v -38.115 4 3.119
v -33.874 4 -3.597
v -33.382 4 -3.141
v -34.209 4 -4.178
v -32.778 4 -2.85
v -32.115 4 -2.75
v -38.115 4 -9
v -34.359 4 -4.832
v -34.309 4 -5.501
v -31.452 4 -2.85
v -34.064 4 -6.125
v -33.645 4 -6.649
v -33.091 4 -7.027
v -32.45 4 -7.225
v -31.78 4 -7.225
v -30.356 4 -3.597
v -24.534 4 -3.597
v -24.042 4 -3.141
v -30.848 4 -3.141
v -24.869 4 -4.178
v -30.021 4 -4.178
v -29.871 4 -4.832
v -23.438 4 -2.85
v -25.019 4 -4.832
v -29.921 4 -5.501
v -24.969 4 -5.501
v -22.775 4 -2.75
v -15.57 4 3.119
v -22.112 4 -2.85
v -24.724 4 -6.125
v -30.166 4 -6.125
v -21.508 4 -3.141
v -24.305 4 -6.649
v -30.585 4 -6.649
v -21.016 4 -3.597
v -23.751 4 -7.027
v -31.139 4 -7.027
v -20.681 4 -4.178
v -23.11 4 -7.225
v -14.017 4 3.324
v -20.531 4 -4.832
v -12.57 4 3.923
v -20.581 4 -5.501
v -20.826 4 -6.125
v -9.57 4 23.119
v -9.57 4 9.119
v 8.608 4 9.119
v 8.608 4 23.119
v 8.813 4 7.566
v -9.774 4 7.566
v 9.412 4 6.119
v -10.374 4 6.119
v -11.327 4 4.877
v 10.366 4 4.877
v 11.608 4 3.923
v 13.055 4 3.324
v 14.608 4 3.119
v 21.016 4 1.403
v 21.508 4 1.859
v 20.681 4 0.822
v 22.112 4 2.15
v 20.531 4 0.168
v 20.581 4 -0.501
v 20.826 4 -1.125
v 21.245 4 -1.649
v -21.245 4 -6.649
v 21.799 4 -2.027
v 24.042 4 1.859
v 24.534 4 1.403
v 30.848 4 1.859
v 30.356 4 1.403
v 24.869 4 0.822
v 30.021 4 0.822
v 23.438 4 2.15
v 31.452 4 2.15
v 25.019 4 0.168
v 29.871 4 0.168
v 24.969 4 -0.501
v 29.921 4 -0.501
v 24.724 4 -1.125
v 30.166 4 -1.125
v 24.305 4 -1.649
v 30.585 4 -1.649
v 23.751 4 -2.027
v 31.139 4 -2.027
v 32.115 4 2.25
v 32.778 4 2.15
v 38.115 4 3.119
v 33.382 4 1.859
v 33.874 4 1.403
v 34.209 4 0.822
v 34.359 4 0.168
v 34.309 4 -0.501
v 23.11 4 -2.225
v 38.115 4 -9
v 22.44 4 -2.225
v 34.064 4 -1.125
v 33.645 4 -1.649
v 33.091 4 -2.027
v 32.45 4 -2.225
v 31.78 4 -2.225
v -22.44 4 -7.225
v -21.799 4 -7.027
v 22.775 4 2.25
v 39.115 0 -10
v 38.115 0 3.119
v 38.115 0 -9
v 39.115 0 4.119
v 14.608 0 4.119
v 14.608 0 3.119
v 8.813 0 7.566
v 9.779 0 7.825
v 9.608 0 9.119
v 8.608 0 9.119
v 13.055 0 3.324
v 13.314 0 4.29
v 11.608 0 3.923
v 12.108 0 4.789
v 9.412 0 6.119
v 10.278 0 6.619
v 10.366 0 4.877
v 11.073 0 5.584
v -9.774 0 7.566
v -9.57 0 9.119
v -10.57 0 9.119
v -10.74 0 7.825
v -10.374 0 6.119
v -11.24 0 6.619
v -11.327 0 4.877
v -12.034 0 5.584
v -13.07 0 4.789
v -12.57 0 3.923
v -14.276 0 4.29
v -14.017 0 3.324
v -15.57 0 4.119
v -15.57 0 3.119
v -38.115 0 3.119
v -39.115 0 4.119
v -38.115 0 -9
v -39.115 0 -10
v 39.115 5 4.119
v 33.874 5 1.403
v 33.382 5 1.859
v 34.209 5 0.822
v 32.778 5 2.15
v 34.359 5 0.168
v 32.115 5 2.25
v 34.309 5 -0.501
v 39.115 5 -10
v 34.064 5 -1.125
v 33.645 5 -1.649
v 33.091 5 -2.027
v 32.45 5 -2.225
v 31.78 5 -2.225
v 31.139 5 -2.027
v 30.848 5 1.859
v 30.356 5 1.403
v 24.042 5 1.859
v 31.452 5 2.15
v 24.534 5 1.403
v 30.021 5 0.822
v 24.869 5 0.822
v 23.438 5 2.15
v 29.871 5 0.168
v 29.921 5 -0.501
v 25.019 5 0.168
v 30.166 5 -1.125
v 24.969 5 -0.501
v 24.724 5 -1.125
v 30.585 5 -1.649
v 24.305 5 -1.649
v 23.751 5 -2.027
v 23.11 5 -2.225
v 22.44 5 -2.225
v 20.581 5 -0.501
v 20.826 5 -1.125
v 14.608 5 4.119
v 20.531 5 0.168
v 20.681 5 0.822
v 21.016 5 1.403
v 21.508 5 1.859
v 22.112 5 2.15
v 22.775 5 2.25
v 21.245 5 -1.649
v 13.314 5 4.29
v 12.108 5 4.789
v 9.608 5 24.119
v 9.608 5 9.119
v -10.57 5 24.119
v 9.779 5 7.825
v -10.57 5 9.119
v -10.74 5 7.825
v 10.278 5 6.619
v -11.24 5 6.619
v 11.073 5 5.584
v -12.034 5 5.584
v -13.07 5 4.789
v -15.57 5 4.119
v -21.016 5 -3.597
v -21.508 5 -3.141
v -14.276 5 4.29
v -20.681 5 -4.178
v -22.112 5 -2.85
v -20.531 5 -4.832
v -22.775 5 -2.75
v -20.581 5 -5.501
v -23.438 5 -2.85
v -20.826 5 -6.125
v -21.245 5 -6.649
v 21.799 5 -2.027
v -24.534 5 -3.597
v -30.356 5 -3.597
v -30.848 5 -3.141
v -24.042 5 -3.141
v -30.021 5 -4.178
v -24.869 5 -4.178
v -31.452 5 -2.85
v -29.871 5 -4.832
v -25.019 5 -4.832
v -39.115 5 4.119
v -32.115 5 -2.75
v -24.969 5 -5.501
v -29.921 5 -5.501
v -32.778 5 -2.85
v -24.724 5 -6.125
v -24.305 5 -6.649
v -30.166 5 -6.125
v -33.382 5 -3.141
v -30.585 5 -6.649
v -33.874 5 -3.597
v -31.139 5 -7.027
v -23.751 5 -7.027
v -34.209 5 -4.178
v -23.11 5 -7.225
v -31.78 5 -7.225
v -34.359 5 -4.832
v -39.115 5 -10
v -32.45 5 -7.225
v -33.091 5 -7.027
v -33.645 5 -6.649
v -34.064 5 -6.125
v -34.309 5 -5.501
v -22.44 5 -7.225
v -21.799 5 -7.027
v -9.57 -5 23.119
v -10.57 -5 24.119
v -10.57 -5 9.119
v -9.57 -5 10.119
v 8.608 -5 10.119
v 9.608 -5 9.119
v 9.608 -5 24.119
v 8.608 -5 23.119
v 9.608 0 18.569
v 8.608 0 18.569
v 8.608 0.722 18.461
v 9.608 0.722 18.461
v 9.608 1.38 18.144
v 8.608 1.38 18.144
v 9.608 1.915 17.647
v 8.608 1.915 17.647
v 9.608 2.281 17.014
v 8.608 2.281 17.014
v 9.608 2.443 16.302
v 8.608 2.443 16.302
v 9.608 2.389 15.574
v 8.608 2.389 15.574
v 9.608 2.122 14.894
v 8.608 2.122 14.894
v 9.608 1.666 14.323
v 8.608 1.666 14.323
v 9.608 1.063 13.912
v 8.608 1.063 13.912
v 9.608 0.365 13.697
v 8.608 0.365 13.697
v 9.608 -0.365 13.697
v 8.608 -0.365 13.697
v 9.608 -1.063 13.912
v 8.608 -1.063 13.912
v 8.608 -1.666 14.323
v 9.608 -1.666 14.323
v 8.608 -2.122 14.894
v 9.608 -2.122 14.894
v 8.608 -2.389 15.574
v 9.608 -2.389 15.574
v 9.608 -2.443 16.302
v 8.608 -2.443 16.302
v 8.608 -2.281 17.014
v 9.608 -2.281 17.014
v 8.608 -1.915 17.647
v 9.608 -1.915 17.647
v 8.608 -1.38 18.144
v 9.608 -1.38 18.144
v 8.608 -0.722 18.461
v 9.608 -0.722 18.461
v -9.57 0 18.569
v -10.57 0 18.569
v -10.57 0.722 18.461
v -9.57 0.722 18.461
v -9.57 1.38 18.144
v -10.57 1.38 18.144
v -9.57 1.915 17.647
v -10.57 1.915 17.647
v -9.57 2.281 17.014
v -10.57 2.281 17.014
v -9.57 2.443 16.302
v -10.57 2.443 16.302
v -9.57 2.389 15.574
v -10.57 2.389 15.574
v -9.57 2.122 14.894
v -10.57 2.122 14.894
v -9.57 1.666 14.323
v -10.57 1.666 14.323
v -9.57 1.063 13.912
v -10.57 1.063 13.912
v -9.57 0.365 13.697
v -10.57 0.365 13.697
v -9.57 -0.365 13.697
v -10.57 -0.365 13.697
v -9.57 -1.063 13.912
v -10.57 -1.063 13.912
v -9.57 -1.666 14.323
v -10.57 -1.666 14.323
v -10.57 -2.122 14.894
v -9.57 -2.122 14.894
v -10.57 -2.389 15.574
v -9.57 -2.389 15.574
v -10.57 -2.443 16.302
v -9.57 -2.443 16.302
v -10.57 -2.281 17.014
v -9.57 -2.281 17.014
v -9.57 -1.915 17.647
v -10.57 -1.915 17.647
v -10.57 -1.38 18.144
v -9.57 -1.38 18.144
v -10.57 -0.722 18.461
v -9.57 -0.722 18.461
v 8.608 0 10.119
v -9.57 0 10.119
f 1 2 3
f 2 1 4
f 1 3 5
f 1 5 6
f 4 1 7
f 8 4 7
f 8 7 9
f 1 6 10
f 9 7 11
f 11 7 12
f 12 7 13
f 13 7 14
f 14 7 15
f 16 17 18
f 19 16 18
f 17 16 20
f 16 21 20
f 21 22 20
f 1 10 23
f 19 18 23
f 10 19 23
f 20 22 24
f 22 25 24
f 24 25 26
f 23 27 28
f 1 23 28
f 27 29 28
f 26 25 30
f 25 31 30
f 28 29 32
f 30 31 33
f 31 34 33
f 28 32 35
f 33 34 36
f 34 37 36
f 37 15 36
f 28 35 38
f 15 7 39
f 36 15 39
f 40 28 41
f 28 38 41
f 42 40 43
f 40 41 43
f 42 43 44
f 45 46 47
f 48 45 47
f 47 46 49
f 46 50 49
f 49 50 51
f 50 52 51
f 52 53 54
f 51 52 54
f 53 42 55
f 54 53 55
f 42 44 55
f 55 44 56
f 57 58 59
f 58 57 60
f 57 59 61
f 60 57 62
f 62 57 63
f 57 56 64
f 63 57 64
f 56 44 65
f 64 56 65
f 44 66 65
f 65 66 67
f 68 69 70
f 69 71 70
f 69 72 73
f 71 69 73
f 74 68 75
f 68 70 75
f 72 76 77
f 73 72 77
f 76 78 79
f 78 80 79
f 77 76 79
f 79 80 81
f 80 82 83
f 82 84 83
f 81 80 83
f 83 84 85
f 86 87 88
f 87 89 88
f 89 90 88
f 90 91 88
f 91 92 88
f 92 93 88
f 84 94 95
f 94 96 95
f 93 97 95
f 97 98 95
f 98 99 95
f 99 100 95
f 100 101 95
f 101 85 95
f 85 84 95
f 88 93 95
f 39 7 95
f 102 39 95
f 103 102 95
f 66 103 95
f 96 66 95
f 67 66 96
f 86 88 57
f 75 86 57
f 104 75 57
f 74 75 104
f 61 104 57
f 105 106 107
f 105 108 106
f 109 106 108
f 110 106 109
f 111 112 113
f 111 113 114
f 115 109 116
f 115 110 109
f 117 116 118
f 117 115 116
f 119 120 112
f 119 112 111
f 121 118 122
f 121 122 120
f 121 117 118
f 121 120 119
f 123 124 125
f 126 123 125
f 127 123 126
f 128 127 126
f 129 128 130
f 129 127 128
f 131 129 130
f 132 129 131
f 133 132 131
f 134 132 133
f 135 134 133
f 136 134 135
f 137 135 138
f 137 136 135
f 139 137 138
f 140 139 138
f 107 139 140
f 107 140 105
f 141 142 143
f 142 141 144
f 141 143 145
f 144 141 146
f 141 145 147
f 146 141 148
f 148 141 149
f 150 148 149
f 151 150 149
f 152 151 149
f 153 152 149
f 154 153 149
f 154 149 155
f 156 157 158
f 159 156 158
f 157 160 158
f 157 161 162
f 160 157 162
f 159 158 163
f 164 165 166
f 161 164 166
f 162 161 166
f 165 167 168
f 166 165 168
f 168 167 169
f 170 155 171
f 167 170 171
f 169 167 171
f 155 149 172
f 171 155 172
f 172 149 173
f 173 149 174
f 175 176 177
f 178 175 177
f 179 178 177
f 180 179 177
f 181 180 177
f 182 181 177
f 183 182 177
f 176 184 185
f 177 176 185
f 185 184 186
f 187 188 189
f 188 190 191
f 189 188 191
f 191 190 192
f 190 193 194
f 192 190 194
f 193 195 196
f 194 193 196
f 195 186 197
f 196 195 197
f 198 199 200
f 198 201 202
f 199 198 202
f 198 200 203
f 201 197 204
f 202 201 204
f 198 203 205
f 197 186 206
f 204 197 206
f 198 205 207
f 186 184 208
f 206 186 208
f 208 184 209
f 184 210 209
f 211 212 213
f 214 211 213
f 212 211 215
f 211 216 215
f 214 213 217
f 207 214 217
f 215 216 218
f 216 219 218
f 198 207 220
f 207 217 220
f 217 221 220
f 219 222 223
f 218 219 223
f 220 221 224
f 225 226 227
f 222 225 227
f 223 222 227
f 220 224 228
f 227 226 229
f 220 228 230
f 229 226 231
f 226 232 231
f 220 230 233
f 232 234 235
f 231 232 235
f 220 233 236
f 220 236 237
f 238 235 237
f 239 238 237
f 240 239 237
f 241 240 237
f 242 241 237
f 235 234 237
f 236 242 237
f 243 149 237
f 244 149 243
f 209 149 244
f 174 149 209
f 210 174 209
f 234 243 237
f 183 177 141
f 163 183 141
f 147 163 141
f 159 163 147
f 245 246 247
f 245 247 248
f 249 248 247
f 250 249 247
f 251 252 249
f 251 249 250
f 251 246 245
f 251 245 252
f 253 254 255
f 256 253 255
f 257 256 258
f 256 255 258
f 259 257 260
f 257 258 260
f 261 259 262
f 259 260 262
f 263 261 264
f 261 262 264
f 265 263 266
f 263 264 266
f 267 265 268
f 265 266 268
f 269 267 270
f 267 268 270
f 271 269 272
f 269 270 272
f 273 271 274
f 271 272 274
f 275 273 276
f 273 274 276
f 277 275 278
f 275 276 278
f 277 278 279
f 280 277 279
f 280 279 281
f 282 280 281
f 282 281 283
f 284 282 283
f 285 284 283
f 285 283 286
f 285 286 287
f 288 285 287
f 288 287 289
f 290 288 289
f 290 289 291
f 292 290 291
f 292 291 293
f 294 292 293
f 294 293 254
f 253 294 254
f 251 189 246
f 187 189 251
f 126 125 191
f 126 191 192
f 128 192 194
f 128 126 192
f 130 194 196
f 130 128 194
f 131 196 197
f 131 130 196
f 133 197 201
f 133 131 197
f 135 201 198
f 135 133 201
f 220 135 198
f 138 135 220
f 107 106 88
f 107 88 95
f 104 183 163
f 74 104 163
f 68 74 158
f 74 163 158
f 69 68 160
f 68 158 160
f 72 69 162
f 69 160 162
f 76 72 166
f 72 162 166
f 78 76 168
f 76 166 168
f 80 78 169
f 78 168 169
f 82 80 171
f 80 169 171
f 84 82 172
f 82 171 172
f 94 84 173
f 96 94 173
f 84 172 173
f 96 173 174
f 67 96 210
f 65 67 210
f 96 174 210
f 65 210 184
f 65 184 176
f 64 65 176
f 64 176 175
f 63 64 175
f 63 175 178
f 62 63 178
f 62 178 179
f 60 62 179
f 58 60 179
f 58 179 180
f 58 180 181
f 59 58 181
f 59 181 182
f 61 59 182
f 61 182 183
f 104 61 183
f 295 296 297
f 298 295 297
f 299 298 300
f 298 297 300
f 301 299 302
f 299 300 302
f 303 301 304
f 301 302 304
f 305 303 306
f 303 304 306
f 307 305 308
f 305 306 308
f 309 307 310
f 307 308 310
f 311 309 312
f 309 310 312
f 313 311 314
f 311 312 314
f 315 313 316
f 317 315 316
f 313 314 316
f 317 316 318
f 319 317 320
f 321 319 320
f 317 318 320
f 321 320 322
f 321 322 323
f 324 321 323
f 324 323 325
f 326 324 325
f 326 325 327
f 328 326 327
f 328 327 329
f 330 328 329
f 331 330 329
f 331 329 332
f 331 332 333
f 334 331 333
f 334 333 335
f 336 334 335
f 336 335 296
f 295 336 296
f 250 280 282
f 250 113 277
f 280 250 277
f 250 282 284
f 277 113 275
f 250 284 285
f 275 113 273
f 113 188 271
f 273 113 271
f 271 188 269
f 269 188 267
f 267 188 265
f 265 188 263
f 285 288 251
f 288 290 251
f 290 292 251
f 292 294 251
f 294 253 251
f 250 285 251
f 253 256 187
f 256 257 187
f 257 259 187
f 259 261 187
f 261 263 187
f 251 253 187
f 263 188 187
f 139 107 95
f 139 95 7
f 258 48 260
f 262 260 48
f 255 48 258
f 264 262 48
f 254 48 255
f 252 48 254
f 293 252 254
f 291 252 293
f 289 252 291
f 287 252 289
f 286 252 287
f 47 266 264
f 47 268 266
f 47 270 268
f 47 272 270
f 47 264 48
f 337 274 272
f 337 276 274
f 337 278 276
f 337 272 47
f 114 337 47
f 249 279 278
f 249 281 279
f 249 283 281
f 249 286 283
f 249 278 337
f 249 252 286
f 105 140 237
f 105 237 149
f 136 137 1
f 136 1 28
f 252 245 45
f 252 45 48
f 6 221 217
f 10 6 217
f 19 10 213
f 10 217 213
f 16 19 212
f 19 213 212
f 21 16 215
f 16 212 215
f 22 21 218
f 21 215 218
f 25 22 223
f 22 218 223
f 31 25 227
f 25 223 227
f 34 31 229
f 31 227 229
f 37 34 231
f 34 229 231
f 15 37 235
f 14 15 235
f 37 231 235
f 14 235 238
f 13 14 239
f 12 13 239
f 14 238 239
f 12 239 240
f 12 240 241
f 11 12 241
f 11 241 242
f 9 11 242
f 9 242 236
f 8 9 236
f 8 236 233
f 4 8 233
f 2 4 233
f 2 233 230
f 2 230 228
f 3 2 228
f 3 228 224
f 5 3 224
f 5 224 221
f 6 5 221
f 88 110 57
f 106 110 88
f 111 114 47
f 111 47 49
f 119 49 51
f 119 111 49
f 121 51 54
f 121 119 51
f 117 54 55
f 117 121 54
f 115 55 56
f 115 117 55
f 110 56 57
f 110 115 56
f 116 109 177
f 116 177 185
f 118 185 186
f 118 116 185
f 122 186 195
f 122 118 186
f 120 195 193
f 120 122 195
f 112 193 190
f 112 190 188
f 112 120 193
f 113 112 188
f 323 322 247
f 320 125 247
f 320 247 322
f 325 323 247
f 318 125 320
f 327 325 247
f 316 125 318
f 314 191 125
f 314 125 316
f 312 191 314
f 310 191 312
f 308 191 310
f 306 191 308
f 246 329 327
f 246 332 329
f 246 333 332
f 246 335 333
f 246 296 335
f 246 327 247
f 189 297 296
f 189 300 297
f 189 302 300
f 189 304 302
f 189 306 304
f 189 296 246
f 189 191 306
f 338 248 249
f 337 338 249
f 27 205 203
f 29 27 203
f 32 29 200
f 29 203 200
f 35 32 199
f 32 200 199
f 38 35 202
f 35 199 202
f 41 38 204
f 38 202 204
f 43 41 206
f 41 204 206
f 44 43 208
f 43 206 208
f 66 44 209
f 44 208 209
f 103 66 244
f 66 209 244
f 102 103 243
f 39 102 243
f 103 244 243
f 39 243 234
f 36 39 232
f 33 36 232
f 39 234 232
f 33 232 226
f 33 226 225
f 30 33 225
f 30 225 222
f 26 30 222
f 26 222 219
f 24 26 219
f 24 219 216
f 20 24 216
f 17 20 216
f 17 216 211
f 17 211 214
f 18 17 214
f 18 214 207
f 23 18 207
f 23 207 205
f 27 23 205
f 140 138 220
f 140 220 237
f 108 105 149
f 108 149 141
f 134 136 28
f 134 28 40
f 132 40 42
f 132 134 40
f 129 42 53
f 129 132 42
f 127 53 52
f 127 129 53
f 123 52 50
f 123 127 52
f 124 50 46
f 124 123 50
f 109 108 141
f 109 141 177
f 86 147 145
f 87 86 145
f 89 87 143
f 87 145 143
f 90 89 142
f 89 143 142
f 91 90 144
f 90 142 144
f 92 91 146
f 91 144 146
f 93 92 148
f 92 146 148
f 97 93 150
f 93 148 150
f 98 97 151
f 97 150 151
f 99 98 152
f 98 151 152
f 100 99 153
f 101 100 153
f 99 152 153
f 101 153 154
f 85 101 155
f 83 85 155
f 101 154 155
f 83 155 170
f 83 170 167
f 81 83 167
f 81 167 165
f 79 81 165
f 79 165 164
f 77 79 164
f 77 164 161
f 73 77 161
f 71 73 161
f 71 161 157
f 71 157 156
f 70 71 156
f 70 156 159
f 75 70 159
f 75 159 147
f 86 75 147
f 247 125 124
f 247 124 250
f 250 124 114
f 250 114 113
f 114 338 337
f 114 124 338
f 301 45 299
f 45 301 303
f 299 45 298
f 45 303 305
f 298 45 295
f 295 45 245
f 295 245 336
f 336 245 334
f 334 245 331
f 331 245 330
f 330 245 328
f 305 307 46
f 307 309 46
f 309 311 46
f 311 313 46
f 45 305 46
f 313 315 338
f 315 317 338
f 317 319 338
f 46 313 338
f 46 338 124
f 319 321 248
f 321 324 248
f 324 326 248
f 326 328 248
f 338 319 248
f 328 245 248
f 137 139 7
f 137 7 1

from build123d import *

# Parameters (mm, degrees)
BOSS_EXTRUDE1_DEPTH = 5
SKETCH8_W           = 20.178262132
SKETCH8_H           = 15
BOSS_EXTRUDE2_DEPTH = 5
SHELL4_DEPTH        = 4
SHELL4_START        = -5
SHELL4_2_OUTLINE_W  = 18.178262132
SHELL4_2_OUTLINE_H  = 13
SHELL4_2_DEPTH      = 5
SKETCH9_R           = 2.45
CUT_EXTRUDE3_DEPTH  = 56.455798629
SKETCH10_R          = 2.25
CUT_EXTRUDE4_DEPTH  = 10


# Read off the part's stored shape, not the designer's step: Shell4
with BuildPart() as part:
    # Sketch2 → Boss-Extrude1 (new body)
    with BuildSketch(Plane(origin=(0, 0, 0), x_dir=(1, 0, 0), z_dir=(0, 1, 0))):
        with BuildLine():
            Line((-39.115, 0.880622479), (-39.115, 10))
            Line((-39.115, 10), (39.115, 10))
            Line((39.115, 10), (39.115, 0.880622479))
            Line((39.115, 0.880622479), (39.115, -4.119377521))
            Line((39.115, -4.119377521), (14.608241959, -4.119377521))
            ThreePointArc((14.608241959, -4.119377521), (11.072708053, -5.583843615), (9.608241959, -9.119377521))
            Line((9.608241959, -9.119377521), (9.608241959, -24.119377521))
            Line((9.608241959, -24.119377521), (-10.570020173, -24.119377521))
            Line((-10.570020173, -24.119377521), (-10.570020173, -9.119377521))
            ThreePointArc((-10.570020173, -9.119377521), (-12.034486267, -5.583843615), (-15.570020173, -4.119377521))
            Line((-15.570020173, -4.119377521), (-39.115, -4.119377521))
            Line((-39.115, -4.119377521), (-39.115, 0.880622479))
        make_face()
    extrude(amount=BOSS_EXTRUDE1_DEPTH)

    # Sketch8 → Boss-Extrude2 (add)
    with BuildSketch(Plane.XZ):
        with Locations((-0.480889107, 16.619377521)):
            Rectangle(SKETCH8_W, SKETCH8_H)
    extrude(amount=BOSS_EXTRUDE2_DEPTH)

    # Shell4 outline → Shell4 (cut)
    with BuildSketch(Plane(origin=(0, 0, 0), x_dir=(1, 0, 0), z_dir=(0, 1, 0))):
        with BuildLine():
            Line((38.115, 9), (-38.115, 9))
            Line((-38.115, 9), (-38.115, -3.119377521))
            Line((-38.115, -3.119377521), (-15.570020173, -3.119377521))
            ThreePointArc((-15.570020173, -3.119377521), (-11.327379486, -4.876736834), (-9.570020173, -9.119377521))
            Line((-9.570020173, -9.119377521), (-9.570020173, -23.119377521))
            Line((-9.570020173, -23.119377521), (8.608241959, -23.119377521))
            Line((8.608241959, -23.119377521), (8.608241959, -9.119377521))
            ThreePointArc((8.608241959, -9.119377521), (10.365601272, -4.876736834), (14.608241959, -3.119377521))
            Line((14.608241959, -3.119377521), (38.115, -3.119377521))
            Line((38.115, -3.119377521), (38.115, 9))
        make_face()
    extrude(amount=SHELL4_DEPTH, mode=Mode.SUBTRACT)

    # Shell4 2 outline → Shell4 2 (cut)
    with BuildSketch(Plane(origin=(0, 0, 0), x_dir=(1, 0, 0), z_dir=(0, 1, 0)).offset(SHELL4_START)):
        with Locations((-0.480889107, -16.619377521)):
            Rectangle(SHELL4_2_OUTLINE_W, SHELL4_2_OUTLINE_H)
    extrude(amount=SHELL4_2_DEPTH, mode=Mode.SUBTRACT)

    # Sketch9 → Cut-Extrude3 (cut, through all)
    with BuildSketch(Plane.ZY.offset(10.570020173)):
        with Locations((16.119377521, 0)):
            Circle(SKETCH9_R)
    extrude(amount=-CUT_EXTRUDE3_DEPTH, mode=Mode.SUBTRACT)

    # Sketch10 → Cut-Extrude4 (cut)
    with BuildSketch(Plane(origin=(0, 5, 0), x_dir=(1, 0, 0), z_dir=(0, 1, 0))):
        with Locations(Location((-32.115, 5, 0), (0, 0, 270))):
            Circle(SKETCH10_R)
        with Locations(Location((-22.775, 5, 0), (0, 0, 270))):
            Circle(SKETCH10_R)
        with Locations(Location((32.115, 0, 0), (0, 0, 270))):
            Circle(SKETCH10_R)
        with Locations(Location((22.775, 0, 0), (0, 0, 270))):
            Circle(SKETCH10_R)
    extrude(amount=-CUT_EXTRUDE4_DEPTH, mode=Mode.SUBTRACT)


solid = part.part
